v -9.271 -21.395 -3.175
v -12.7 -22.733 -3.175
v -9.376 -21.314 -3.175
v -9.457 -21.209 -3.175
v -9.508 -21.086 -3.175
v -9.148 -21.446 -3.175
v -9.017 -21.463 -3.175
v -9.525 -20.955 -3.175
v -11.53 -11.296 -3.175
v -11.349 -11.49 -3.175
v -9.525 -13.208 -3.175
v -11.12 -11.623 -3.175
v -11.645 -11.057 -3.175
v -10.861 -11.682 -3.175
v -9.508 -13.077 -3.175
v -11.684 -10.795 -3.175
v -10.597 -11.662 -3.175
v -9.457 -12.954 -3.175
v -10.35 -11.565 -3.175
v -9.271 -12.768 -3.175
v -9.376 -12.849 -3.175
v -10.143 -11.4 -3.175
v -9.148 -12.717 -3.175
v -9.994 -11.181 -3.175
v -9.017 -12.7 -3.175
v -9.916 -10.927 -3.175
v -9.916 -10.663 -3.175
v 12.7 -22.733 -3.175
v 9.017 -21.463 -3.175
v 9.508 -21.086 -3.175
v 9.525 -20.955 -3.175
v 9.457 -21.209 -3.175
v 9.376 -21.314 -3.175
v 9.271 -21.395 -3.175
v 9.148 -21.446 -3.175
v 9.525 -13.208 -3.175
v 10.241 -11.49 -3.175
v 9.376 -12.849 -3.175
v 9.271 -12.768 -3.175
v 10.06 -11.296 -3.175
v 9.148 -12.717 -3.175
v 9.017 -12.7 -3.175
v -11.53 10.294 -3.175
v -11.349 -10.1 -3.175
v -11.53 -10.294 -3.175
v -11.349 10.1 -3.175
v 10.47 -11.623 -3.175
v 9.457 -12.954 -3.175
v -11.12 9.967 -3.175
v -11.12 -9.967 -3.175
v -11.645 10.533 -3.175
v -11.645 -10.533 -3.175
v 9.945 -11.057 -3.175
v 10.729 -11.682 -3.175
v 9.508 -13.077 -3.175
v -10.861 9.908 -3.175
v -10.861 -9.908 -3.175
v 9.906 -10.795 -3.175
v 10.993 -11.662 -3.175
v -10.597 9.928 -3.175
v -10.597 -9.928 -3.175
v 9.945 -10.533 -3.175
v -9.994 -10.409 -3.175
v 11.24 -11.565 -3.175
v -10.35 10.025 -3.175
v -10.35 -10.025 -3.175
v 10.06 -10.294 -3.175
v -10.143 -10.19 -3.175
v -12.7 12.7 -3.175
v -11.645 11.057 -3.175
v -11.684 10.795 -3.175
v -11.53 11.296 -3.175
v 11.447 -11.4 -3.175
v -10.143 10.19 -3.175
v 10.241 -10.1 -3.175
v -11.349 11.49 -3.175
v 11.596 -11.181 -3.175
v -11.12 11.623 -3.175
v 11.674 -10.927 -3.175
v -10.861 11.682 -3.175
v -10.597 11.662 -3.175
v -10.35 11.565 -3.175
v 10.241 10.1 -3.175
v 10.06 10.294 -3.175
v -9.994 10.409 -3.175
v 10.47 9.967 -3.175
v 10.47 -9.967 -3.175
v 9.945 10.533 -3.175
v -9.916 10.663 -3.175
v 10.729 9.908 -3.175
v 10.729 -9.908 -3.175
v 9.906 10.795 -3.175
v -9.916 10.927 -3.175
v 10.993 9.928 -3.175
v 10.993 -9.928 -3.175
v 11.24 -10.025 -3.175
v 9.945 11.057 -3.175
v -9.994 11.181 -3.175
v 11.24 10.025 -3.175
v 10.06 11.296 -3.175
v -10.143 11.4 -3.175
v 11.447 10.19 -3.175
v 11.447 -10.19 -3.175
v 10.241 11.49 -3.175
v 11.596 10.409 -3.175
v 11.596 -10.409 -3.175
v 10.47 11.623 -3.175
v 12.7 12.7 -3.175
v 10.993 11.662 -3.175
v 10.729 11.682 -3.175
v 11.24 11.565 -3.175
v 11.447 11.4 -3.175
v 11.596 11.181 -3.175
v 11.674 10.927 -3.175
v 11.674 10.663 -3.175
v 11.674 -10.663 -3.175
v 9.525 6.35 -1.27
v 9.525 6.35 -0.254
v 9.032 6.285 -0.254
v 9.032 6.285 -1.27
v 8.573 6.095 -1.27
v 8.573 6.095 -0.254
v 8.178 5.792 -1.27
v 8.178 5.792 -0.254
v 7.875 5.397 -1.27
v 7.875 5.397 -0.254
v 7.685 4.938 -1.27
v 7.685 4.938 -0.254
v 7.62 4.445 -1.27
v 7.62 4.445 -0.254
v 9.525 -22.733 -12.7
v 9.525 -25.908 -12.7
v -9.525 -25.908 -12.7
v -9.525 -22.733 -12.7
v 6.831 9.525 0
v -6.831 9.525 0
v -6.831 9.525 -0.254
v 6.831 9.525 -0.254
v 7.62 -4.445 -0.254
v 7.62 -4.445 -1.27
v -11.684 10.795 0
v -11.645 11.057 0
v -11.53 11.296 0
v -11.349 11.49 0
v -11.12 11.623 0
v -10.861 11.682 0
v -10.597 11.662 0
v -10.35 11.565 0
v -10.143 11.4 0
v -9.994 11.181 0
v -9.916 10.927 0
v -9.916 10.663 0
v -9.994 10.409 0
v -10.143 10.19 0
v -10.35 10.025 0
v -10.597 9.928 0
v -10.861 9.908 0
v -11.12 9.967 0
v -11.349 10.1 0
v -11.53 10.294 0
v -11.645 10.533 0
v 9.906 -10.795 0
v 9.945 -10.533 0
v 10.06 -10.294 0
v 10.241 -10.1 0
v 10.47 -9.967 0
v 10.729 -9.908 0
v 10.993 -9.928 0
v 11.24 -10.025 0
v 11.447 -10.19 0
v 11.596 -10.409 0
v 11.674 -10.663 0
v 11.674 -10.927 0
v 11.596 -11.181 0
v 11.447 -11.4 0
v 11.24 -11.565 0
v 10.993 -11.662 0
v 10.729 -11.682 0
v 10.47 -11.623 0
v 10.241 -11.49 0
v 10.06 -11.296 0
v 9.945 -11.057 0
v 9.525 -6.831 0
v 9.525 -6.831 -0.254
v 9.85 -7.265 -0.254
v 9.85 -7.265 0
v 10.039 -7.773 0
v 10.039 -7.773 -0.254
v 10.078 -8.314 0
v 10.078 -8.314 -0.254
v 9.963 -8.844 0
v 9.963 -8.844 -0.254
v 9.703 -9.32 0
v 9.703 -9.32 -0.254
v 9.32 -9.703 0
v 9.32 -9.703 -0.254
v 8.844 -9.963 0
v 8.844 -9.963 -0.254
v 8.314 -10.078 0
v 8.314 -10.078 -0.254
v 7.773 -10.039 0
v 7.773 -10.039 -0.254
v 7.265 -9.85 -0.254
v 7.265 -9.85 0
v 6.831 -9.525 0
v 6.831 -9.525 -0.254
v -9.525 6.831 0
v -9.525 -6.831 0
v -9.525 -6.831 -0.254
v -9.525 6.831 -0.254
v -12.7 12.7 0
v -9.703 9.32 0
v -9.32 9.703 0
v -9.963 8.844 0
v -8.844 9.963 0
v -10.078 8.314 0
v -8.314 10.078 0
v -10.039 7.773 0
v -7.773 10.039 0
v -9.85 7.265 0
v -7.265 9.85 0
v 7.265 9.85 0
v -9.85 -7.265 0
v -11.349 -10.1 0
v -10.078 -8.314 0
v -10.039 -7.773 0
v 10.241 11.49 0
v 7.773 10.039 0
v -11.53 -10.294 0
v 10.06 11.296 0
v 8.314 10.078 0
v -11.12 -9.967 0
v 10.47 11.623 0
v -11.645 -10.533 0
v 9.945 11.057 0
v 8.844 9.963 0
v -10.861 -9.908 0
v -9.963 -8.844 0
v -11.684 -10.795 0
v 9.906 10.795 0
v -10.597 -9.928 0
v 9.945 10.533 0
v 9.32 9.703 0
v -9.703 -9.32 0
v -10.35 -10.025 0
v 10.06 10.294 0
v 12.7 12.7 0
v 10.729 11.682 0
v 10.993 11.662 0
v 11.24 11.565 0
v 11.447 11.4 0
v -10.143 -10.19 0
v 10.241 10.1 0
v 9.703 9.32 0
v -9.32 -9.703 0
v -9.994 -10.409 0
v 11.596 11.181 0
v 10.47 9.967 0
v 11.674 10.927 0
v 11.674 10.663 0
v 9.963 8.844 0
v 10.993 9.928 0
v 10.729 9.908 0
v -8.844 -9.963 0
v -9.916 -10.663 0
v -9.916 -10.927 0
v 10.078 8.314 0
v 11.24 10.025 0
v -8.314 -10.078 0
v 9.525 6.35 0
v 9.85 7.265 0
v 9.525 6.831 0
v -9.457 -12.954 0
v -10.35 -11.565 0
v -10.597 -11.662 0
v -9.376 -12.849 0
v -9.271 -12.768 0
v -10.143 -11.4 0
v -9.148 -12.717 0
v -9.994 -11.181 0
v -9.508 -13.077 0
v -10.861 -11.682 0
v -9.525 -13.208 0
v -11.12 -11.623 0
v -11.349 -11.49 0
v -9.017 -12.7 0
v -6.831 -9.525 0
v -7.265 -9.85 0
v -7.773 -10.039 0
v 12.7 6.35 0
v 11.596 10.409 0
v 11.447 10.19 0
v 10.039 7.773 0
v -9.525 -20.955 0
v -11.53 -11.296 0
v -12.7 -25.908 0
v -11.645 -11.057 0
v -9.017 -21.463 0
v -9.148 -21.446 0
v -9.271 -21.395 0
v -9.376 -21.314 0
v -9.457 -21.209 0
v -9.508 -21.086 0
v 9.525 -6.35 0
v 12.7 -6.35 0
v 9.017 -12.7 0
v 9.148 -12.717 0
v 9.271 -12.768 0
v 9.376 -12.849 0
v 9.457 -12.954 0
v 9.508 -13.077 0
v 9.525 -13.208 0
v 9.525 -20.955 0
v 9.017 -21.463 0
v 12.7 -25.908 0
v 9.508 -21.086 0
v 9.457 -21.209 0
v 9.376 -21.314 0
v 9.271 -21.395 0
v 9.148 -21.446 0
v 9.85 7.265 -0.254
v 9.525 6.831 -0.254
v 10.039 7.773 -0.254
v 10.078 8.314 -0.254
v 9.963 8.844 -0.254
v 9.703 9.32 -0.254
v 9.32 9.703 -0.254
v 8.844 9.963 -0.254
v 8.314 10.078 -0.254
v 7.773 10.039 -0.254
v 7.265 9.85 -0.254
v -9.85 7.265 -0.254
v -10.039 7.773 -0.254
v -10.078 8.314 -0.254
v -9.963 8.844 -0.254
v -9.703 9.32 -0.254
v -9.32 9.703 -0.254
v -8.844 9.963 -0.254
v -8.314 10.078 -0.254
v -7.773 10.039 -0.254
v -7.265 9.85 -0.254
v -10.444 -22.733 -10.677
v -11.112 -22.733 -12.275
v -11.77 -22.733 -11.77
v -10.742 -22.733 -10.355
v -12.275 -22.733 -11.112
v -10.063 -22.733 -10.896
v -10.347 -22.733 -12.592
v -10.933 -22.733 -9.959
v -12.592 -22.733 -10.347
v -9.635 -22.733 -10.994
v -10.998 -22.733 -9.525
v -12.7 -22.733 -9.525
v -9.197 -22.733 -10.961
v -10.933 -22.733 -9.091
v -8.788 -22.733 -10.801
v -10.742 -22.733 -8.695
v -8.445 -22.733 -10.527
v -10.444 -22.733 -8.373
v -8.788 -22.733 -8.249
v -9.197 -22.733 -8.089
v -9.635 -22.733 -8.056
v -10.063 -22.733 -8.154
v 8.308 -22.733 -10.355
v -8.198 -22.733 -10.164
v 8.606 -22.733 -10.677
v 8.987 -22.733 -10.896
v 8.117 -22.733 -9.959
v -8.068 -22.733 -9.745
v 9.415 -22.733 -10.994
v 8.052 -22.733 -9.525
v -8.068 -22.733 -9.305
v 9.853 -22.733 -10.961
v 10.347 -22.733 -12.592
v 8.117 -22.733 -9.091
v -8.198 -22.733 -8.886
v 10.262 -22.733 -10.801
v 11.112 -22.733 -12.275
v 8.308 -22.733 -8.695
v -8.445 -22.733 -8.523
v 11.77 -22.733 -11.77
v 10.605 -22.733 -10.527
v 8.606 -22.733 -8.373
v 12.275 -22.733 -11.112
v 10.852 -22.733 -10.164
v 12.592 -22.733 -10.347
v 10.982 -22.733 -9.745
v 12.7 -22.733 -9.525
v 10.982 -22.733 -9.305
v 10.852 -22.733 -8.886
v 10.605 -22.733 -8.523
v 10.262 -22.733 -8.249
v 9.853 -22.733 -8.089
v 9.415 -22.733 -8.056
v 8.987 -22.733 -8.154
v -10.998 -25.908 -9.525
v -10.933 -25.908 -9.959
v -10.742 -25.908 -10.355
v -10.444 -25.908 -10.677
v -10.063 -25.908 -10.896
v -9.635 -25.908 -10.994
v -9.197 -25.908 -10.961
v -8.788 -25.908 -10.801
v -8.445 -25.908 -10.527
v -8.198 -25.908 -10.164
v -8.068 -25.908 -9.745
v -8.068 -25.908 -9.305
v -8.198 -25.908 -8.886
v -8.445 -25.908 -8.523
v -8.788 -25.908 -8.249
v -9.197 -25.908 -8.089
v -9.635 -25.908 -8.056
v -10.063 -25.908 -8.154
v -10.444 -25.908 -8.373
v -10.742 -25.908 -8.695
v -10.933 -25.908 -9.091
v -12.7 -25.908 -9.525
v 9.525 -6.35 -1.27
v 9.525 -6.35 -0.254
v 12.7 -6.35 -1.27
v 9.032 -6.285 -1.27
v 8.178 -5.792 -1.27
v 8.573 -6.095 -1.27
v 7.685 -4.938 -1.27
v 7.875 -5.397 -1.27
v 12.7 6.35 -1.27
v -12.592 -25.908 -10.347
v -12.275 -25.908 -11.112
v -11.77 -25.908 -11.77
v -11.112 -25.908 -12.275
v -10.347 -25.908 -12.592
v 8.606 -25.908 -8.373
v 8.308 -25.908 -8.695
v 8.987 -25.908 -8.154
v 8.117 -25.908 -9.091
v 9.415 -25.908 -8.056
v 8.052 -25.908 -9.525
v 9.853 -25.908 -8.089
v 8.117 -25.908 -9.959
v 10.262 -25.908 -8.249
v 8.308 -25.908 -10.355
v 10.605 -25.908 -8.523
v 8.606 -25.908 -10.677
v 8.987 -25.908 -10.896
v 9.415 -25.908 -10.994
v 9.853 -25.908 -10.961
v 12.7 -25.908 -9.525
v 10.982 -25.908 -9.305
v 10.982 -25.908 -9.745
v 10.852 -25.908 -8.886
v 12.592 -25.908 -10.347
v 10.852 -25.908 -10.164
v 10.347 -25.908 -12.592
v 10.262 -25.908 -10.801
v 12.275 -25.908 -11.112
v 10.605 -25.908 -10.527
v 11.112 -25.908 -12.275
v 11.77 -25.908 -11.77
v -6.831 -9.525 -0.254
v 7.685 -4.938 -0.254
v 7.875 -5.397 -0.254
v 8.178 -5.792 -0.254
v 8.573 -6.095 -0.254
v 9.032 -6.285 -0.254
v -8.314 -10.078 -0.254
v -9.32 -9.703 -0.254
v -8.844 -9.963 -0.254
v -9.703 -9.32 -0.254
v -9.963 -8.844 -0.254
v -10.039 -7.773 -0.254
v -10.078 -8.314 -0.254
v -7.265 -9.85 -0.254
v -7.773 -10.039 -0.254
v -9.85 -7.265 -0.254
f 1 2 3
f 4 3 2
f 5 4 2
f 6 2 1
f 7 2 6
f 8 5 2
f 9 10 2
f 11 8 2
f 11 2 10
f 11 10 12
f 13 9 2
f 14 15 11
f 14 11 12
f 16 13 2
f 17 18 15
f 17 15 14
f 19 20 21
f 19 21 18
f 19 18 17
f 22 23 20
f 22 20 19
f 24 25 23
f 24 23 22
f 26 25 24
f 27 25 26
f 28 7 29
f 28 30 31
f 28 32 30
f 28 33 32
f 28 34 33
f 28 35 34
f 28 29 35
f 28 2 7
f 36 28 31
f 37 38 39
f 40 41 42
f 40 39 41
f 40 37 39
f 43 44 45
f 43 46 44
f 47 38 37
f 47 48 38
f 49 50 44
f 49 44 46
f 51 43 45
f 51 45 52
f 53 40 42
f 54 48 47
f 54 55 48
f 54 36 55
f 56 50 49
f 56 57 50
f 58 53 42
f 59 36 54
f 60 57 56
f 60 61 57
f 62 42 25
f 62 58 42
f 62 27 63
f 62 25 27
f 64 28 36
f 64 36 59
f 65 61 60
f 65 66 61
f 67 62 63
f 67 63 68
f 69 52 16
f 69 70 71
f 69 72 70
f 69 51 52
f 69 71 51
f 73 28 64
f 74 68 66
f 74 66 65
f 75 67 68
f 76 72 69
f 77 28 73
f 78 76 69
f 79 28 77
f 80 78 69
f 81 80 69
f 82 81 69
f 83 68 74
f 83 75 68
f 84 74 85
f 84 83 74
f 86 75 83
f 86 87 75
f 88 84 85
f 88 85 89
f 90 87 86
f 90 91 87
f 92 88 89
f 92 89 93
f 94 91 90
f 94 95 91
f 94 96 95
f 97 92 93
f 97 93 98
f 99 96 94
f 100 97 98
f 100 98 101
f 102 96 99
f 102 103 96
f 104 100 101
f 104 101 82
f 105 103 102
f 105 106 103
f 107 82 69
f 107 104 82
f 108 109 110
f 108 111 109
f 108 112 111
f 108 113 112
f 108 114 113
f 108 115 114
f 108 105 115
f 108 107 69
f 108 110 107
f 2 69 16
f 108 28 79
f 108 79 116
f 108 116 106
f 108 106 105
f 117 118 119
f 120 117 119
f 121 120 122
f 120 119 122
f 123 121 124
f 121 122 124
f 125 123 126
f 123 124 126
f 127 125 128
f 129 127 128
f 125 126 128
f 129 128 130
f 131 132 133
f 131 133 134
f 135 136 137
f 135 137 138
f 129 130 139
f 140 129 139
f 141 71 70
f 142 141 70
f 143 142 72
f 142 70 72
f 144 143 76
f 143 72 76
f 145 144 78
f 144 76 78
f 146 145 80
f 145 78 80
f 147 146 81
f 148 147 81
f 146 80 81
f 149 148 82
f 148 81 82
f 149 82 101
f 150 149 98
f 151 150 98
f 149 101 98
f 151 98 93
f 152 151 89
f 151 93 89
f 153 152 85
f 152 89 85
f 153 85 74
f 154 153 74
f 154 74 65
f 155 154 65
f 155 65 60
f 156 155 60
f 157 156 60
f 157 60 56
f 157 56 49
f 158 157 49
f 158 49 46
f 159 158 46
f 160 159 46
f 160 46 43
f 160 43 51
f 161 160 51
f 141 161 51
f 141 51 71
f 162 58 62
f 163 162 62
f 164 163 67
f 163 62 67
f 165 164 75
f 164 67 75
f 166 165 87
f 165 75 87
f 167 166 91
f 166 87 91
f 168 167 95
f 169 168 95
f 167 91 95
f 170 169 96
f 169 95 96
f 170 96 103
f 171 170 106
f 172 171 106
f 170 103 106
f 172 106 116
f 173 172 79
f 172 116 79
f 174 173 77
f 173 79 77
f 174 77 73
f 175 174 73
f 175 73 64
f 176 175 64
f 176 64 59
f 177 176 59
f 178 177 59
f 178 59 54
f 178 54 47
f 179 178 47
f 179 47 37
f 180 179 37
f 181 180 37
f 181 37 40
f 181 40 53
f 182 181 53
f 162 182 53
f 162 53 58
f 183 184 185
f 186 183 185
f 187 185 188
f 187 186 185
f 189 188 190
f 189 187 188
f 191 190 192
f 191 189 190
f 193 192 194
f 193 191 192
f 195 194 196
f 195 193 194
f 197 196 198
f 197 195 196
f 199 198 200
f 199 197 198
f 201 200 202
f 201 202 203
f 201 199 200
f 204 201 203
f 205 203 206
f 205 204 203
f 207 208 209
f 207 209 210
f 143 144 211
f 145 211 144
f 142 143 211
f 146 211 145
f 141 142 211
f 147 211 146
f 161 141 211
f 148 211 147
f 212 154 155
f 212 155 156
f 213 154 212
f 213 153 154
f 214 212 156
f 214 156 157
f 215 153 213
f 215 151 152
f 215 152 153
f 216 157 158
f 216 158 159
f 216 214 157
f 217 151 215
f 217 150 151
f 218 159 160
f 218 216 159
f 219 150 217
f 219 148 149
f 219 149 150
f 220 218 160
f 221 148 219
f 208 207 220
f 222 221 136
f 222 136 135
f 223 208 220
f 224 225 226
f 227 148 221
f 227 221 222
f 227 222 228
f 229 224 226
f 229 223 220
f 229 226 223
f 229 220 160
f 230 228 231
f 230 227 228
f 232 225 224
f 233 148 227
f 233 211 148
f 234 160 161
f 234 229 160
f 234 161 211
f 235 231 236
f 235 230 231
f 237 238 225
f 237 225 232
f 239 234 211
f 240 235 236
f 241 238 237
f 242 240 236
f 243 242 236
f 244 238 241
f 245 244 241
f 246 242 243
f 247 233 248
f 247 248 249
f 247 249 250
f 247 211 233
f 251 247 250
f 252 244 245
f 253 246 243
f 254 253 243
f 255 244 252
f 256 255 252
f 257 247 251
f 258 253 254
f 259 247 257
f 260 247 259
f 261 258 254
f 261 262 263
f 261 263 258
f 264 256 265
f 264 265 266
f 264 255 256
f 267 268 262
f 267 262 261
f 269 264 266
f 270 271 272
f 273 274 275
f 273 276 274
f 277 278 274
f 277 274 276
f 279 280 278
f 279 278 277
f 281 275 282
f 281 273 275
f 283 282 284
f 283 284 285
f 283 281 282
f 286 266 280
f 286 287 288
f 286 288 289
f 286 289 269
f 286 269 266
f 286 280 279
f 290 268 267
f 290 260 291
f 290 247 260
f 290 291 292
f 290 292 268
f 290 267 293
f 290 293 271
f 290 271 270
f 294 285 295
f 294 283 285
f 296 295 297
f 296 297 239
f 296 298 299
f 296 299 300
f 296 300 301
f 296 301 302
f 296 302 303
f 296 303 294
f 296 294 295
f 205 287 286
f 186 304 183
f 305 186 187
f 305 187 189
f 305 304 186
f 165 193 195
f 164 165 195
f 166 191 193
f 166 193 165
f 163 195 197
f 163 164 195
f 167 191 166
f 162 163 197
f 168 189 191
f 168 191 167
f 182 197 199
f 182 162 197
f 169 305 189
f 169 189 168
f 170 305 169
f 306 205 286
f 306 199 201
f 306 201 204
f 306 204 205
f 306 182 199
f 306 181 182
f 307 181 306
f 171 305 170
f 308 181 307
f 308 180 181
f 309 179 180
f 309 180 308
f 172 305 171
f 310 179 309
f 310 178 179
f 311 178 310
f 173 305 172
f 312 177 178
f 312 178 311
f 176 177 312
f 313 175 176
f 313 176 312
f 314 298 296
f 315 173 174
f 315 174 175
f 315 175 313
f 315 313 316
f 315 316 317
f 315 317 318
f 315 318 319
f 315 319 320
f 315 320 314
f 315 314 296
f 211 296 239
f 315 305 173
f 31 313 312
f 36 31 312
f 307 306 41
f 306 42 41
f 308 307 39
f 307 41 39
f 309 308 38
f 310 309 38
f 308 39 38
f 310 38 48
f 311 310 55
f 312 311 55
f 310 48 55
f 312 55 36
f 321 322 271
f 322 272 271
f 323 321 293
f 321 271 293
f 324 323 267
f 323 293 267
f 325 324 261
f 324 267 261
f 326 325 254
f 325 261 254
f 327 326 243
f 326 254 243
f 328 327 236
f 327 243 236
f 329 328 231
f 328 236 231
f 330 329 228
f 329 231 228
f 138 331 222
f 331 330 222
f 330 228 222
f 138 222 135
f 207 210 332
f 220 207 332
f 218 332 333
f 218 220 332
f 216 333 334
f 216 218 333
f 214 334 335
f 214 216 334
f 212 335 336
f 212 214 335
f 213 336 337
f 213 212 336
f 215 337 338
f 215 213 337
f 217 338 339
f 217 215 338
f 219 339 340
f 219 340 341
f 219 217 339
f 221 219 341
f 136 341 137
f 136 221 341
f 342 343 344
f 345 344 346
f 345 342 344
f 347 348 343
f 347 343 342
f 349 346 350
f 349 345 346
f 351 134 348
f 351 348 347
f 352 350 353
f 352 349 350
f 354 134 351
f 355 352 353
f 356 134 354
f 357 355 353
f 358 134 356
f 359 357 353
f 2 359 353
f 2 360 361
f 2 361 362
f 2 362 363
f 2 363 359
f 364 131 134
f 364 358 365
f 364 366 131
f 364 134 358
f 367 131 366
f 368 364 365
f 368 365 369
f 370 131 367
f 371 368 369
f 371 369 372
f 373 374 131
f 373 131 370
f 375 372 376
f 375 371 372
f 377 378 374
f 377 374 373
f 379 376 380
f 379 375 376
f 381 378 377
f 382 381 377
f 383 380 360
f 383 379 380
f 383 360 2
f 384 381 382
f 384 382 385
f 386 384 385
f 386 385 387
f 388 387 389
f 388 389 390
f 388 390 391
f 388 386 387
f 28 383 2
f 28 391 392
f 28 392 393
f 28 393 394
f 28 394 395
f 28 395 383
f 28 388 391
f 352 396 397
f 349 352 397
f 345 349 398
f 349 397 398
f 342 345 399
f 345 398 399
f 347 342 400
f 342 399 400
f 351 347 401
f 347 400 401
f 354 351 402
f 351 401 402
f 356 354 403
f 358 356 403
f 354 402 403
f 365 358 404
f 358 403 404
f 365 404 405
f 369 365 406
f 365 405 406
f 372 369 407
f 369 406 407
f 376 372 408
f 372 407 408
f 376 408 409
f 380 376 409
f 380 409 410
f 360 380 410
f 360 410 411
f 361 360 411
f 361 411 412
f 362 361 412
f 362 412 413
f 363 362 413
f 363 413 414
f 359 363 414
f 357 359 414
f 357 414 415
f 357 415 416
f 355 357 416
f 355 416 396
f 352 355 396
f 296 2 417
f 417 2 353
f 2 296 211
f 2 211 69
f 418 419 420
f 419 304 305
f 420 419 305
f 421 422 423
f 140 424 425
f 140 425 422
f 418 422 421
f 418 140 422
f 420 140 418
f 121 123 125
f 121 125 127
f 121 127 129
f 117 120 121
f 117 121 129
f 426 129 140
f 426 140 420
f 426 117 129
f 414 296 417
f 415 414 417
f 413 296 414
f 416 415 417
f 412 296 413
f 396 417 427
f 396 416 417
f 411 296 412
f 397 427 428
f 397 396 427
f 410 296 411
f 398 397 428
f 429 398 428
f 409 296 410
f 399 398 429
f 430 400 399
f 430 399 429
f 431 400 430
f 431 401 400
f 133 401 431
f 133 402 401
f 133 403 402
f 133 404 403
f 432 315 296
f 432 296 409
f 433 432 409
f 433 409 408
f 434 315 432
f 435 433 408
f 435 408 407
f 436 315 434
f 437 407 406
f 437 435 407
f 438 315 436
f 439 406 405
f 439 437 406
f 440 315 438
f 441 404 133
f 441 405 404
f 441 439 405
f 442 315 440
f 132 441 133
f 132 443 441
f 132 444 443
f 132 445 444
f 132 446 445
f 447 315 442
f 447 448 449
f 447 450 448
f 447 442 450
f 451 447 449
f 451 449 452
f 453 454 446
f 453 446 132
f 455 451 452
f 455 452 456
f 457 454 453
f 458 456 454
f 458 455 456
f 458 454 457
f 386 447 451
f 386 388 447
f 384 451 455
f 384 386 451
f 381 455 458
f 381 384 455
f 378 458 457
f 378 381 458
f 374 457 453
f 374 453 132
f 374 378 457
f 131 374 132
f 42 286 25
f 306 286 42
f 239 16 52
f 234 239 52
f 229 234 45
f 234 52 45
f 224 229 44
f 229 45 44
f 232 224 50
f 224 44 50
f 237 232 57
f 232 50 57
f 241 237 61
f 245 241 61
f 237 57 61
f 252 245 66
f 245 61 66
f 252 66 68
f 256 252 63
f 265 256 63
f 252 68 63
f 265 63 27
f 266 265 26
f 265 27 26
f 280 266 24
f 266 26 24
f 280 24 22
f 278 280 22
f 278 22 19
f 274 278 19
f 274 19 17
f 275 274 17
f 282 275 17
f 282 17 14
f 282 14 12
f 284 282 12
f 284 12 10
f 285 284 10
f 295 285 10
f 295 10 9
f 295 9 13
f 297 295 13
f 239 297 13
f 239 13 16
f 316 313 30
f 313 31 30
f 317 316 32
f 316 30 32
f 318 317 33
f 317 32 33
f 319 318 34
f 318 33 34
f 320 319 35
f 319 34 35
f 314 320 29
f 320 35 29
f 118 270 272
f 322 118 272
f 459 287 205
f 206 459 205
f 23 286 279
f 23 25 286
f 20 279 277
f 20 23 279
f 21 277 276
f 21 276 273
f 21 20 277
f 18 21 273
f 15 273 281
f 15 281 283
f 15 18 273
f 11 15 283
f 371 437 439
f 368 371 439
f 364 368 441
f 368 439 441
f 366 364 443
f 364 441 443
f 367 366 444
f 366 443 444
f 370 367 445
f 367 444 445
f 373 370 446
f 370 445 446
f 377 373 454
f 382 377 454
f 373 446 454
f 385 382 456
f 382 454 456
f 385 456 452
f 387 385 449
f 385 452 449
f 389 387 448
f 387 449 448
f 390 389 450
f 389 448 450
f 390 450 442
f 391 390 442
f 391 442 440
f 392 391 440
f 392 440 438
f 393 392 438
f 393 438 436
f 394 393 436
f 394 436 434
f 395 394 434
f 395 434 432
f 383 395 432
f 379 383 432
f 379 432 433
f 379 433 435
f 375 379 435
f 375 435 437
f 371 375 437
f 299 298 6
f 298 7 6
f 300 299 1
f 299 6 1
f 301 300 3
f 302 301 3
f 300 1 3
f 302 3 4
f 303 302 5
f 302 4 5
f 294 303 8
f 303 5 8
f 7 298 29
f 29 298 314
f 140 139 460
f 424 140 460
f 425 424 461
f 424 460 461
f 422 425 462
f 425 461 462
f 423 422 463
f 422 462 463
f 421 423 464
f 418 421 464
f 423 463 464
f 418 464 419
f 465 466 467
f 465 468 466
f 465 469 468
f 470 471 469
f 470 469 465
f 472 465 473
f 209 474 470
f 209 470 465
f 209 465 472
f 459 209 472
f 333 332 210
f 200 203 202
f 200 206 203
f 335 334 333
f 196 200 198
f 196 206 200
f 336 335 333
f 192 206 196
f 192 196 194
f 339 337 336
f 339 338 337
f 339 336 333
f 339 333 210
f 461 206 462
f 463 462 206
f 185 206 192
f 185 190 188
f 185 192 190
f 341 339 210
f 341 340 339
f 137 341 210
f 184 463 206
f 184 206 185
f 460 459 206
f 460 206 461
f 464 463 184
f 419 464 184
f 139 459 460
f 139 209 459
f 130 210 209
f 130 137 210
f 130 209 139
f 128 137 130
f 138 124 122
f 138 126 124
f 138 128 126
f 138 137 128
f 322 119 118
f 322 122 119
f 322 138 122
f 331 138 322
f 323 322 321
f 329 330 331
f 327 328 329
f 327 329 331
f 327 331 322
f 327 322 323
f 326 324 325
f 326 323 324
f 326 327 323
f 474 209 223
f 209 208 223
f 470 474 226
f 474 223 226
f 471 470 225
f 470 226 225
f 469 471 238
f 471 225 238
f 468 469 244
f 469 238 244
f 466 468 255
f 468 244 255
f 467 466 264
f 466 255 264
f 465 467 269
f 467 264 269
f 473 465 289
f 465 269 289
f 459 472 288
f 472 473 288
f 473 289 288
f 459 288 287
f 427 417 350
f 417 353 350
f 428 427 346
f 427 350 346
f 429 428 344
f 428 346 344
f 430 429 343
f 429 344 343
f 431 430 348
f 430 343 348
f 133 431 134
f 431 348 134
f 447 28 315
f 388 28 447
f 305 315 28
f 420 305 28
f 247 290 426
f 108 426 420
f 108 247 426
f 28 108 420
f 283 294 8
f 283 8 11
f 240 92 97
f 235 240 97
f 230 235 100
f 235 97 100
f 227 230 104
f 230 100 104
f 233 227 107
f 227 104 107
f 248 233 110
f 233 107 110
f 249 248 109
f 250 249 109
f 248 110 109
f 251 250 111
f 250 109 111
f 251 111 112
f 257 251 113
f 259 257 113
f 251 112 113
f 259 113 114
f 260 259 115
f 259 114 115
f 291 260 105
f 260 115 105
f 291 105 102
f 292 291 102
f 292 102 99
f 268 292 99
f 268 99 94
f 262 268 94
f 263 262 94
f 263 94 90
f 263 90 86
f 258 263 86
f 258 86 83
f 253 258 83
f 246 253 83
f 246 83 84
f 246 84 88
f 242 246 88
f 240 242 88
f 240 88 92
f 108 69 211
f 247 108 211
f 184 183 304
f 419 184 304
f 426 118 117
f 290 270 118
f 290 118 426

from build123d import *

# Parameters (mm, degrees)
BOSS_EXTRUDE1_DEPTH     = 12.7
SKETCH2_W               = 19.05
SKETCH2_H               = 19.05
CUT_EXTRUDE1_DEPTH      = 0.254
SKETCH3_W               = 3.175
SKETCH3_H               = 12.7
CUT_EXTRUDE2_DEPTH      = 1.27
SKETCH4_R               = 1.905
CUT_EXTRUDE3_DEPTH      = 0.254
MIRROR2_COPY_1_SKETCH_R = 1.905
MIRROR2_COPY_1_DEPTH    = 0.254
CUT_EXTRUDE4_DEPTH      = 1.016
FILLET1_R               = 3.175
F_2_56_TAPPED_HOLE1_D   = 1.778
SKETCH8_W               = 19.05
SKETCH8_H               = 8.763
CUT_EXTRUDE5_DEPTH      = 13.7
FILLET2_R               = 0.508
F_4_CLEARANCE_HOLE1_D   = 2.9464


with BuildPart() as part:
    # Sketch1 → Boss-Extrude1 (new body, symmetric)
    with BuildSketch(Plane(origin=(0, 0, 0), x_dir=(0, 0, -1), z_dir=(1, 0, 0))):
        Polygon((0, 12.7), (0, -25.908), (12.7, -25.908), (12.7, -22.733), (3.175, -22.733), (3.175, 12.7), align=None)
    extrude(amount=BOSS_EXTRUDE1_DEPTH, both=True)

    # Sketch2 → Cut-Extrude1 (cut)
    with BuildSketch(Plane.XY):
        Rectangle(SKETCH2_W, SKETCH2_H)
    extrude(amount=-CUT_EXTRUDE1_DEPTH, mode=Mode.SUBTRACT)

    # Sketch3 → Cut-Extrude2 (cut)
    with BuildSketch(Plane.XY):
        with Locations((11.1125, 0)):
            Rectangle(SKETCH3_W, SKETCH3_H)
    extrude(amount=-CUT_EXTRUDE2_DEPTH, mode=Mode.SUBTRACT)

    # Sketch4 → Cut-Extrude3 (cut)
    with BuildSketch(Plane.XY):
        with Locations((8.177961582, 8.177961582)):
            Circle(SKETCH4_R)
    cut_extrude3 = extrude(amount=-CUT_EXTRUDE3_DEPTH, mode=Mode.SUBTRACT)

    # Mirror1: Cut-Extrude3 across plane
    add(cut_extrude3.mirror(Plane(origin=(0, 0, 0), x_dir=(0, 0, 1), z_dir=(1, 0, 0))), mode=Mode.SUBTRACT)

    # Mirror2: Cut-Extrude3 across plane
    add(cut_extrude3.mirror(Plane.ZX), mode=Mode.SUBTRACT)

    # Mirror2 copy 1 sketch → Mirror2 copy 1 (cut)
    with BuildSketch(Plane(origin=(0, 0, 0), x_dir=(-1, 0, 0), z_dir=(0, 0, 1))):
        with Locations((8.177961582, 8.177961582)):
            Circle(MIRROR2_COPY_1_SKETCH_R)
    extrude(amount=-MIRROR2_COPY_1_DEPTH, mode=Mode.SUBTRACT)

    # Sketch5 → Cut-Extrude4 (cut)
    with BuildSketch(Plane.XY.offset(-0.254)):
        with BuildLine():
            Line((7.62, 4.445), (7.62, -4.445))
            ThreePointArc((7.62, -4.445), (8.177961582, -5.792038418), (9.525, -6.35))
            Line((9.525, -6.35), (9.525, 6.35))
            ThreePointArc((9.525, 6.35), (8.177961582, 5.792038418), (7.62, 4.445))
        make_face()
    extrude(amount=-CUT_EXTRUDE4_DEPTH, mode=Mode.SUBTRACT)

    # Fillet1
    fillet1_edges = [part.edges().sort_by_distance(p)[0] for p in [
        (12.7, -24.3205, -12.7),
        (-12.7, -24.3205, -12.7),
    ]]
    fillet(fillet1_edges, radius=FILLET1_R)

    # #2-56 Tapped Hole1 (through all)
    with Locations(Plane.XY):
        with Locations((-10.795, 10.795), (10.795, 10.795), (10.795, -10.795), (-10.795, -10.795)):
            Hole(F_2_56_TAPPED_HOLE1_D / 2)

    # Sketch8 → Cut-Extrude5 (cut, through all)
    with BuildSketch(Plane.XY):
        with Locations((0, -17.0815)):
            Rectangle(SKETCH8_W, SKETCH8_H)
    extrude(amount=-CUT_EXTRUDE5_DEPTH, mode=Mode.SUBTRACT)

    # Fillet2
    fillet2_edges = [part.edges().sort_by_distance(p)[0] for p in [
        (-9.525, -21.463, -1.5875),
        (-9.525, -12.7, -1.5875),
        (9.525, -12.7, -1.5875),
        (9.525, -21.463, -1.5875),
    ]]
    fillet(fillet2_edges, radius=FILLET2_R)

    # #4 Clearance Hole1 (through all)
    with Locations(Plane(origin=(0, -22.733, 0), x_dir=(1, 0, 0), z_dir=(0, 1, 0))):
        with Locations((-9.525, 9.525), (9.525, 9.525)):
            Hole(F_4_CLEARANCE_HOLE1_D / 2)


solid = part.part
